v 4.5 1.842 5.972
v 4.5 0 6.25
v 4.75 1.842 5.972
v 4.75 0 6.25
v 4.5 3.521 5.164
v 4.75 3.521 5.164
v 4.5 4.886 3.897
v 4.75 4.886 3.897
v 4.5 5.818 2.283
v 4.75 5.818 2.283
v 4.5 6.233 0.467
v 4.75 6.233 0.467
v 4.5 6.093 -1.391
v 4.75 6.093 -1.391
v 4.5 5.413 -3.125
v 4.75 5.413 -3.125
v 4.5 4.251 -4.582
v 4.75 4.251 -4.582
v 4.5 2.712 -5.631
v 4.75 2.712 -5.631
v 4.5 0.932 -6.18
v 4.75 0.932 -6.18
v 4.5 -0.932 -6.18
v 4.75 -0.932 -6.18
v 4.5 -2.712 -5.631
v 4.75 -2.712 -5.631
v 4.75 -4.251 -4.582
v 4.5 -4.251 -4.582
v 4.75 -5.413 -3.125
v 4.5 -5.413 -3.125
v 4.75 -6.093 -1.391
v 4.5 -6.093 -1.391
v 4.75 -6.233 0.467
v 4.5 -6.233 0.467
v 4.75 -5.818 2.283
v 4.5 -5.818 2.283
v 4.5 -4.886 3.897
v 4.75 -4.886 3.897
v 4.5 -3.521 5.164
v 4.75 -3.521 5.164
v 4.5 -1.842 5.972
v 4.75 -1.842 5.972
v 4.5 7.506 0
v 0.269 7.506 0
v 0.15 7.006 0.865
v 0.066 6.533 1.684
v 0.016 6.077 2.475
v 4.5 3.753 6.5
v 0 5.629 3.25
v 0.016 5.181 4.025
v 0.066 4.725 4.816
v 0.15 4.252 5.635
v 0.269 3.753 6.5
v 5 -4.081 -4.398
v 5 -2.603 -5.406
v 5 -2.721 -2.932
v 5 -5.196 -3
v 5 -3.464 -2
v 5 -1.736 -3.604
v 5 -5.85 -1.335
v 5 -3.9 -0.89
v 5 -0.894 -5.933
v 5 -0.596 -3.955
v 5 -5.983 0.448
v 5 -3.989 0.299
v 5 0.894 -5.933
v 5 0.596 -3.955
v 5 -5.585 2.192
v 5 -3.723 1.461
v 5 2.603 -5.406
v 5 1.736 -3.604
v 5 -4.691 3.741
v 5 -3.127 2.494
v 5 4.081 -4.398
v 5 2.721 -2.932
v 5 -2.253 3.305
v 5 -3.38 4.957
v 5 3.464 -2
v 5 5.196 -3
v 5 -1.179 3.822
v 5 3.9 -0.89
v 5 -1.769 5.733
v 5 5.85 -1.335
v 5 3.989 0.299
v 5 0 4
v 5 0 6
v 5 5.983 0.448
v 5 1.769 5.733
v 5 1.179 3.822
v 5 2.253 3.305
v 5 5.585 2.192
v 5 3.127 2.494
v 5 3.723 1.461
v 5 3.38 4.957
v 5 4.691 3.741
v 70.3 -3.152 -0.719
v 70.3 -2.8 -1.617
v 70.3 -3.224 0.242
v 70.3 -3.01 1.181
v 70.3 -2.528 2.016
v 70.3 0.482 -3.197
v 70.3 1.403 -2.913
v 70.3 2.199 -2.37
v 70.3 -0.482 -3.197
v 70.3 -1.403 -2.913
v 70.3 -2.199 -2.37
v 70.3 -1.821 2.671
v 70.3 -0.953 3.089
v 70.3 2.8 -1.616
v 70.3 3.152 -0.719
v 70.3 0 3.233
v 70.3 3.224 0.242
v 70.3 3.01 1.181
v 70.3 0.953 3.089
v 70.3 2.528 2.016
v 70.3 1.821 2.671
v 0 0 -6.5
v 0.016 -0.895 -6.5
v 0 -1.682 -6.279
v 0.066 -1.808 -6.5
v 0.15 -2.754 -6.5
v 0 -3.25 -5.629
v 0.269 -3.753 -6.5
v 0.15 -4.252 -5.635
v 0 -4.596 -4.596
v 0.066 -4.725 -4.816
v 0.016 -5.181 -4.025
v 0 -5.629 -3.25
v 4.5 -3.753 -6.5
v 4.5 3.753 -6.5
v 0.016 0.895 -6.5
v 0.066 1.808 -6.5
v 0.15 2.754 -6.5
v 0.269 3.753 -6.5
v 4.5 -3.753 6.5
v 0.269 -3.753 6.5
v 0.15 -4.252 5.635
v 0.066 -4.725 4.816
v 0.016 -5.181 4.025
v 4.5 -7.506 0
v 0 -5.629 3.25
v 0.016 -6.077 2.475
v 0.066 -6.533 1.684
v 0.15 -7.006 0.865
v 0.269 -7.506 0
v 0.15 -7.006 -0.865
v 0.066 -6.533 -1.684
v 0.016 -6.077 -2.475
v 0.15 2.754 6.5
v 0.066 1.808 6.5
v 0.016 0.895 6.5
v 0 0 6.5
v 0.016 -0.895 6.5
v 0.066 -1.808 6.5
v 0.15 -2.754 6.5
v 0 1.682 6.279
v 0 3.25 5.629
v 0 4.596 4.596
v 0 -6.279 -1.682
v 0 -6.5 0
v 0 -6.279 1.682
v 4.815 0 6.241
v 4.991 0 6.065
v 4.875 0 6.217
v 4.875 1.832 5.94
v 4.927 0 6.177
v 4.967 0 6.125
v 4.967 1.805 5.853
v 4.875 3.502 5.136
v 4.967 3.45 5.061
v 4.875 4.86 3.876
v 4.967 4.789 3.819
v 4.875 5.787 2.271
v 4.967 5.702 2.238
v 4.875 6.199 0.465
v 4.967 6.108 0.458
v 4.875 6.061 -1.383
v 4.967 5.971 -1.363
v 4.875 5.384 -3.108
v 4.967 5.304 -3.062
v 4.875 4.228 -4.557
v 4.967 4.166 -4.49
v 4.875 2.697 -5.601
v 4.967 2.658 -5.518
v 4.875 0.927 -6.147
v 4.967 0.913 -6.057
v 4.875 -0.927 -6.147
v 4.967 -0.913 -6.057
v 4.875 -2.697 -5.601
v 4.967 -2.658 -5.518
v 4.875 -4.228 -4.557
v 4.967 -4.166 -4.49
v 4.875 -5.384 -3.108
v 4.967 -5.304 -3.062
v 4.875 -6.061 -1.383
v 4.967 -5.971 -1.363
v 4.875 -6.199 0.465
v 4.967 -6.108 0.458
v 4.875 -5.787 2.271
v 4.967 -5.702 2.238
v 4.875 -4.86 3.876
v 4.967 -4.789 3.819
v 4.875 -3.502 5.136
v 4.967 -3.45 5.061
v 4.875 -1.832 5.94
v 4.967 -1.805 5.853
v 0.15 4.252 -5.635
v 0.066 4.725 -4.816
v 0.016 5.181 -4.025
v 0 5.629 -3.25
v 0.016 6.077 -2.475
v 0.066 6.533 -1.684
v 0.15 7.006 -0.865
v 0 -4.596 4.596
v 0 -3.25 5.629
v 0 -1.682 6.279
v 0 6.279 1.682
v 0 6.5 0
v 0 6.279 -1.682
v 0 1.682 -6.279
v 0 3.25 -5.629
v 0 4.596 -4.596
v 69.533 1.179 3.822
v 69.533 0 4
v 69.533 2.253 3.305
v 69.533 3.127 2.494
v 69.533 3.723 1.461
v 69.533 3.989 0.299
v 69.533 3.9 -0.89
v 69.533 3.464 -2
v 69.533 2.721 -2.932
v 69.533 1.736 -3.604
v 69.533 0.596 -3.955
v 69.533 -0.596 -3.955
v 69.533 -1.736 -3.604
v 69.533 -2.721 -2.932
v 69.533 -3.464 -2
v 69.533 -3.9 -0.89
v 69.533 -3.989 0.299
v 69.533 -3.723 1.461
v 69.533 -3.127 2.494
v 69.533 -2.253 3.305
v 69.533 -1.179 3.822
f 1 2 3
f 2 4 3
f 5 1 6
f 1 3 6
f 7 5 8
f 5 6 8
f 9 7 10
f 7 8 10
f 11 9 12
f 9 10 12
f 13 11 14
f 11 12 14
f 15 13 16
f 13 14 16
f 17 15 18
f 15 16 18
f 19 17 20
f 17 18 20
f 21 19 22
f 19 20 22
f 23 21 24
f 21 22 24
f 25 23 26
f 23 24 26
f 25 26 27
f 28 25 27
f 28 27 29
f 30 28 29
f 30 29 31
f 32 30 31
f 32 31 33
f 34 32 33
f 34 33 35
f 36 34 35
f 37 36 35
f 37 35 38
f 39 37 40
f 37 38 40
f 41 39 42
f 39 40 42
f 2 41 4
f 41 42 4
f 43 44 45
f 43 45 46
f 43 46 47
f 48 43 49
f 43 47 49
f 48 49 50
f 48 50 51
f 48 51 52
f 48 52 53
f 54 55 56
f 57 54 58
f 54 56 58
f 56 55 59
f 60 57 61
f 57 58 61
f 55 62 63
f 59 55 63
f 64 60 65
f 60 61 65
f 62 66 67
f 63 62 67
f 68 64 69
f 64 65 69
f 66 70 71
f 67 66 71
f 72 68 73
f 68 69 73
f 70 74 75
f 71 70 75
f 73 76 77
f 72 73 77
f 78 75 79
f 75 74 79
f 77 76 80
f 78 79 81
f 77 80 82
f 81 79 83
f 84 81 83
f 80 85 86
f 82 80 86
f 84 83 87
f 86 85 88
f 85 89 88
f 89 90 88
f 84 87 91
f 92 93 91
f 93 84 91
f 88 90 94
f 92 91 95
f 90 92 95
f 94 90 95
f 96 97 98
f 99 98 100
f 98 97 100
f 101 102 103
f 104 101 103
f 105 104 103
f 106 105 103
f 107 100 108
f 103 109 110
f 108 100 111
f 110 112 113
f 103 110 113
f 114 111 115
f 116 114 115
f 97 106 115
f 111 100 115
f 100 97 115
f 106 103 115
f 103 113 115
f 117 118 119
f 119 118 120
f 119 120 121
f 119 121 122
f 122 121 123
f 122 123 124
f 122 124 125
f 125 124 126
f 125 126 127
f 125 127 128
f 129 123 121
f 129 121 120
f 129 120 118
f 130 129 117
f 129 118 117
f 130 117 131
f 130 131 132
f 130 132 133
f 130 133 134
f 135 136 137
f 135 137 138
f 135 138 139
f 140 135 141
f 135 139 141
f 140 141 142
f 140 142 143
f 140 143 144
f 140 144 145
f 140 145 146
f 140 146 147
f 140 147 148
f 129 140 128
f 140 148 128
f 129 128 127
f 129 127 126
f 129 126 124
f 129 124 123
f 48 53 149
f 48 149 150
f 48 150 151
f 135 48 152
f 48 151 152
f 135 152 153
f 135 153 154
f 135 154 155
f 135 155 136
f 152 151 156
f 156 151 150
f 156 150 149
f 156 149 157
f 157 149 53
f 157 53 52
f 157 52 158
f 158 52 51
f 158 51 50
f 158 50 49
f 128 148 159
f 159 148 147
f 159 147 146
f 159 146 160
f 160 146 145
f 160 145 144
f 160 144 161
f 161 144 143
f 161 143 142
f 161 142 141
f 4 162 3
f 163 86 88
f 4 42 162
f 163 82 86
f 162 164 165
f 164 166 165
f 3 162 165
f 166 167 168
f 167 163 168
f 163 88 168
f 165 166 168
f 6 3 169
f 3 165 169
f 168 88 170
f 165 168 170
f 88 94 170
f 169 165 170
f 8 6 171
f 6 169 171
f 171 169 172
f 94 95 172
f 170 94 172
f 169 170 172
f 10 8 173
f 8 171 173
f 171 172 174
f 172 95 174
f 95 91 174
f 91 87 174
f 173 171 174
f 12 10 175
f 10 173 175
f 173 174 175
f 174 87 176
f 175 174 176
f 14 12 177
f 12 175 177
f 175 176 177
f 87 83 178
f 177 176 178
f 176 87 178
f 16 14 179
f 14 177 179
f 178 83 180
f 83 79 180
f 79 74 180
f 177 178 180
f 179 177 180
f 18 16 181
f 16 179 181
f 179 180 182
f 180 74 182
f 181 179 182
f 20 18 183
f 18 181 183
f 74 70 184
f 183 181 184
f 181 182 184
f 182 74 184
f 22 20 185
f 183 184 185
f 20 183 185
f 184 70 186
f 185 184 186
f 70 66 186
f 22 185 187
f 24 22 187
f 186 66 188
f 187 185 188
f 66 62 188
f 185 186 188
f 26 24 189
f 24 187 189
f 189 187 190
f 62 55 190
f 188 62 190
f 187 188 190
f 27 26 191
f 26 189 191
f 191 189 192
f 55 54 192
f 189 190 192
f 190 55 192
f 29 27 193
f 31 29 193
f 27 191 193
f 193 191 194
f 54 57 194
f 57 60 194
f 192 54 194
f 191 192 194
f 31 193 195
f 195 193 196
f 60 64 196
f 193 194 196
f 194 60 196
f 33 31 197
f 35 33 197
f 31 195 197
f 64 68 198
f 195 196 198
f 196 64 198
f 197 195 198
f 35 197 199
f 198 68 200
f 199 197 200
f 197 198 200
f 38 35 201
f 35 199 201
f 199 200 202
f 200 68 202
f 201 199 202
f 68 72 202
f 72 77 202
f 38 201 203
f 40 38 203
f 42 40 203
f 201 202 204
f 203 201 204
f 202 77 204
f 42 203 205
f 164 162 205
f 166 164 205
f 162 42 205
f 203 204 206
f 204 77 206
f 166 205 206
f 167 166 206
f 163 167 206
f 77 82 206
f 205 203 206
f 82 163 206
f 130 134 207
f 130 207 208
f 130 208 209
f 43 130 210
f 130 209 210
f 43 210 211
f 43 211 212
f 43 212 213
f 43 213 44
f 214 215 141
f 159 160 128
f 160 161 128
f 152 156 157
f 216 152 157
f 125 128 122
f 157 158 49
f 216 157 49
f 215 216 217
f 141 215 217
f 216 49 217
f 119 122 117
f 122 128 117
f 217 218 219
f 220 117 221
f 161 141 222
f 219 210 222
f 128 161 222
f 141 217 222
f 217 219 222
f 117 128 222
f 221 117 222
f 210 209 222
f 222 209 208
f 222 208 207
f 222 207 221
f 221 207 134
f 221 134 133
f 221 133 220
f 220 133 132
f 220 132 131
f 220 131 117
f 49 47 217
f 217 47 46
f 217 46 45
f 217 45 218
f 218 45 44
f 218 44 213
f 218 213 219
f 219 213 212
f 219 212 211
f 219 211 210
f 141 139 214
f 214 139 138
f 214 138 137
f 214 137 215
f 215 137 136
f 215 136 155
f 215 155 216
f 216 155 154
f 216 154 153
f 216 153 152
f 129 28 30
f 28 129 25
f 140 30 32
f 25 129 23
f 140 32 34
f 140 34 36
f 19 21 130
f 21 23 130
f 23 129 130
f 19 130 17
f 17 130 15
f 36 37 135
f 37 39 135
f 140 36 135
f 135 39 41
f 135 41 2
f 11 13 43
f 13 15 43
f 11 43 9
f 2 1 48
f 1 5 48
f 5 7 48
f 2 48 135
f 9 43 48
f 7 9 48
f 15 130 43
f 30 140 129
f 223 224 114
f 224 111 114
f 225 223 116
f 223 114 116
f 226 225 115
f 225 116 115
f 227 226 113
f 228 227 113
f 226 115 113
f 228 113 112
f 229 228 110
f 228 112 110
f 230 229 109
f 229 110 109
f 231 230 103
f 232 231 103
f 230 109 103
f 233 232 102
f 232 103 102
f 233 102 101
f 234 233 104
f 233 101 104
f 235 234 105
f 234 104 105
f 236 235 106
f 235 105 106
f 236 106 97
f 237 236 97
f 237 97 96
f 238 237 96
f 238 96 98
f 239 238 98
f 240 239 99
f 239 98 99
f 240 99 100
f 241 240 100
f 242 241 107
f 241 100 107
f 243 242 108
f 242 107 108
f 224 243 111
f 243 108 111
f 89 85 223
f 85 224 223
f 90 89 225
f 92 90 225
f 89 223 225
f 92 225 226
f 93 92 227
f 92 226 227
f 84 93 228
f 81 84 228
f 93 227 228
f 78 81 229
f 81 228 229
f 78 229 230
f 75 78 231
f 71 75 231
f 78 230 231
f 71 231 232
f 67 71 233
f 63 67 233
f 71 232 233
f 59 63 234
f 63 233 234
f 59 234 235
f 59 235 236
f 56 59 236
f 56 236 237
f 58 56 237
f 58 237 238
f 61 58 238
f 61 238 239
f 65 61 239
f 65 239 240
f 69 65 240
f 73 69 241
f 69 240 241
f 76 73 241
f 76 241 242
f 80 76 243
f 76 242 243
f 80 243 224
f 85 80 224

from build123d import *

# Parameters (mm, degrees)
SKETCH_2_W          = 52
SKETCH_2_H          = 52
CUT_EXTRUDE_1_DEPTH = 4.5


with BuildPart() as part:
    # 草图1 → 旋转1 (revolve)
    with BuildSketch(Plane.XY):
        with BuildLine():
            Line((0, 0), (0, 6.5))
            Line((0, 6.5), (0.34833395, 7.8))
            Line((0.34833395, 7.8), (4.5, 7.8))
            Line((4.5, 7.8), (4.5, 6.25))
            Line((4.5, 6.25), (4.75, 6.25))
            ThreePointArc((4.75, 6.25), (4.926776695, 6.176776695), (5, 6))
            Line((5, 6), (5, 4))
            Line((5, 4), (69.533, 4))
            Line((69.533, 4), (70.3, 3.233))
            Line((70.3, 3.233), (70.3, 0))
            Line((70.3, 0), (0, 0))
        make_face()
    revolve(axis=Axis((70.3, 0, 0), (-1, 0, 0)))

    # 草图2 → 切除-拉伸1 (cut)
    with BuildSketch(Plane(origin=(0, 0, 0), x_dir=(0, 0, -1), z_dir=(1, 0, 0))):
        Rectangle(SKETCH_2_W, SKETCH_2_H)
        Polygon((-6.5, 3.75277675), (-6.5, -3.75277675), (0, -7.505553499), (6.5, -3.75277675), (6.5, 3.75277675), (0, 7.505553499), align=None, mode=Mode.SUBTRACT)
    extrude(amount=CUT_EXTRUDE_1_DEPTH, mode=Mode.SUBTRACT)


solid = part.part
